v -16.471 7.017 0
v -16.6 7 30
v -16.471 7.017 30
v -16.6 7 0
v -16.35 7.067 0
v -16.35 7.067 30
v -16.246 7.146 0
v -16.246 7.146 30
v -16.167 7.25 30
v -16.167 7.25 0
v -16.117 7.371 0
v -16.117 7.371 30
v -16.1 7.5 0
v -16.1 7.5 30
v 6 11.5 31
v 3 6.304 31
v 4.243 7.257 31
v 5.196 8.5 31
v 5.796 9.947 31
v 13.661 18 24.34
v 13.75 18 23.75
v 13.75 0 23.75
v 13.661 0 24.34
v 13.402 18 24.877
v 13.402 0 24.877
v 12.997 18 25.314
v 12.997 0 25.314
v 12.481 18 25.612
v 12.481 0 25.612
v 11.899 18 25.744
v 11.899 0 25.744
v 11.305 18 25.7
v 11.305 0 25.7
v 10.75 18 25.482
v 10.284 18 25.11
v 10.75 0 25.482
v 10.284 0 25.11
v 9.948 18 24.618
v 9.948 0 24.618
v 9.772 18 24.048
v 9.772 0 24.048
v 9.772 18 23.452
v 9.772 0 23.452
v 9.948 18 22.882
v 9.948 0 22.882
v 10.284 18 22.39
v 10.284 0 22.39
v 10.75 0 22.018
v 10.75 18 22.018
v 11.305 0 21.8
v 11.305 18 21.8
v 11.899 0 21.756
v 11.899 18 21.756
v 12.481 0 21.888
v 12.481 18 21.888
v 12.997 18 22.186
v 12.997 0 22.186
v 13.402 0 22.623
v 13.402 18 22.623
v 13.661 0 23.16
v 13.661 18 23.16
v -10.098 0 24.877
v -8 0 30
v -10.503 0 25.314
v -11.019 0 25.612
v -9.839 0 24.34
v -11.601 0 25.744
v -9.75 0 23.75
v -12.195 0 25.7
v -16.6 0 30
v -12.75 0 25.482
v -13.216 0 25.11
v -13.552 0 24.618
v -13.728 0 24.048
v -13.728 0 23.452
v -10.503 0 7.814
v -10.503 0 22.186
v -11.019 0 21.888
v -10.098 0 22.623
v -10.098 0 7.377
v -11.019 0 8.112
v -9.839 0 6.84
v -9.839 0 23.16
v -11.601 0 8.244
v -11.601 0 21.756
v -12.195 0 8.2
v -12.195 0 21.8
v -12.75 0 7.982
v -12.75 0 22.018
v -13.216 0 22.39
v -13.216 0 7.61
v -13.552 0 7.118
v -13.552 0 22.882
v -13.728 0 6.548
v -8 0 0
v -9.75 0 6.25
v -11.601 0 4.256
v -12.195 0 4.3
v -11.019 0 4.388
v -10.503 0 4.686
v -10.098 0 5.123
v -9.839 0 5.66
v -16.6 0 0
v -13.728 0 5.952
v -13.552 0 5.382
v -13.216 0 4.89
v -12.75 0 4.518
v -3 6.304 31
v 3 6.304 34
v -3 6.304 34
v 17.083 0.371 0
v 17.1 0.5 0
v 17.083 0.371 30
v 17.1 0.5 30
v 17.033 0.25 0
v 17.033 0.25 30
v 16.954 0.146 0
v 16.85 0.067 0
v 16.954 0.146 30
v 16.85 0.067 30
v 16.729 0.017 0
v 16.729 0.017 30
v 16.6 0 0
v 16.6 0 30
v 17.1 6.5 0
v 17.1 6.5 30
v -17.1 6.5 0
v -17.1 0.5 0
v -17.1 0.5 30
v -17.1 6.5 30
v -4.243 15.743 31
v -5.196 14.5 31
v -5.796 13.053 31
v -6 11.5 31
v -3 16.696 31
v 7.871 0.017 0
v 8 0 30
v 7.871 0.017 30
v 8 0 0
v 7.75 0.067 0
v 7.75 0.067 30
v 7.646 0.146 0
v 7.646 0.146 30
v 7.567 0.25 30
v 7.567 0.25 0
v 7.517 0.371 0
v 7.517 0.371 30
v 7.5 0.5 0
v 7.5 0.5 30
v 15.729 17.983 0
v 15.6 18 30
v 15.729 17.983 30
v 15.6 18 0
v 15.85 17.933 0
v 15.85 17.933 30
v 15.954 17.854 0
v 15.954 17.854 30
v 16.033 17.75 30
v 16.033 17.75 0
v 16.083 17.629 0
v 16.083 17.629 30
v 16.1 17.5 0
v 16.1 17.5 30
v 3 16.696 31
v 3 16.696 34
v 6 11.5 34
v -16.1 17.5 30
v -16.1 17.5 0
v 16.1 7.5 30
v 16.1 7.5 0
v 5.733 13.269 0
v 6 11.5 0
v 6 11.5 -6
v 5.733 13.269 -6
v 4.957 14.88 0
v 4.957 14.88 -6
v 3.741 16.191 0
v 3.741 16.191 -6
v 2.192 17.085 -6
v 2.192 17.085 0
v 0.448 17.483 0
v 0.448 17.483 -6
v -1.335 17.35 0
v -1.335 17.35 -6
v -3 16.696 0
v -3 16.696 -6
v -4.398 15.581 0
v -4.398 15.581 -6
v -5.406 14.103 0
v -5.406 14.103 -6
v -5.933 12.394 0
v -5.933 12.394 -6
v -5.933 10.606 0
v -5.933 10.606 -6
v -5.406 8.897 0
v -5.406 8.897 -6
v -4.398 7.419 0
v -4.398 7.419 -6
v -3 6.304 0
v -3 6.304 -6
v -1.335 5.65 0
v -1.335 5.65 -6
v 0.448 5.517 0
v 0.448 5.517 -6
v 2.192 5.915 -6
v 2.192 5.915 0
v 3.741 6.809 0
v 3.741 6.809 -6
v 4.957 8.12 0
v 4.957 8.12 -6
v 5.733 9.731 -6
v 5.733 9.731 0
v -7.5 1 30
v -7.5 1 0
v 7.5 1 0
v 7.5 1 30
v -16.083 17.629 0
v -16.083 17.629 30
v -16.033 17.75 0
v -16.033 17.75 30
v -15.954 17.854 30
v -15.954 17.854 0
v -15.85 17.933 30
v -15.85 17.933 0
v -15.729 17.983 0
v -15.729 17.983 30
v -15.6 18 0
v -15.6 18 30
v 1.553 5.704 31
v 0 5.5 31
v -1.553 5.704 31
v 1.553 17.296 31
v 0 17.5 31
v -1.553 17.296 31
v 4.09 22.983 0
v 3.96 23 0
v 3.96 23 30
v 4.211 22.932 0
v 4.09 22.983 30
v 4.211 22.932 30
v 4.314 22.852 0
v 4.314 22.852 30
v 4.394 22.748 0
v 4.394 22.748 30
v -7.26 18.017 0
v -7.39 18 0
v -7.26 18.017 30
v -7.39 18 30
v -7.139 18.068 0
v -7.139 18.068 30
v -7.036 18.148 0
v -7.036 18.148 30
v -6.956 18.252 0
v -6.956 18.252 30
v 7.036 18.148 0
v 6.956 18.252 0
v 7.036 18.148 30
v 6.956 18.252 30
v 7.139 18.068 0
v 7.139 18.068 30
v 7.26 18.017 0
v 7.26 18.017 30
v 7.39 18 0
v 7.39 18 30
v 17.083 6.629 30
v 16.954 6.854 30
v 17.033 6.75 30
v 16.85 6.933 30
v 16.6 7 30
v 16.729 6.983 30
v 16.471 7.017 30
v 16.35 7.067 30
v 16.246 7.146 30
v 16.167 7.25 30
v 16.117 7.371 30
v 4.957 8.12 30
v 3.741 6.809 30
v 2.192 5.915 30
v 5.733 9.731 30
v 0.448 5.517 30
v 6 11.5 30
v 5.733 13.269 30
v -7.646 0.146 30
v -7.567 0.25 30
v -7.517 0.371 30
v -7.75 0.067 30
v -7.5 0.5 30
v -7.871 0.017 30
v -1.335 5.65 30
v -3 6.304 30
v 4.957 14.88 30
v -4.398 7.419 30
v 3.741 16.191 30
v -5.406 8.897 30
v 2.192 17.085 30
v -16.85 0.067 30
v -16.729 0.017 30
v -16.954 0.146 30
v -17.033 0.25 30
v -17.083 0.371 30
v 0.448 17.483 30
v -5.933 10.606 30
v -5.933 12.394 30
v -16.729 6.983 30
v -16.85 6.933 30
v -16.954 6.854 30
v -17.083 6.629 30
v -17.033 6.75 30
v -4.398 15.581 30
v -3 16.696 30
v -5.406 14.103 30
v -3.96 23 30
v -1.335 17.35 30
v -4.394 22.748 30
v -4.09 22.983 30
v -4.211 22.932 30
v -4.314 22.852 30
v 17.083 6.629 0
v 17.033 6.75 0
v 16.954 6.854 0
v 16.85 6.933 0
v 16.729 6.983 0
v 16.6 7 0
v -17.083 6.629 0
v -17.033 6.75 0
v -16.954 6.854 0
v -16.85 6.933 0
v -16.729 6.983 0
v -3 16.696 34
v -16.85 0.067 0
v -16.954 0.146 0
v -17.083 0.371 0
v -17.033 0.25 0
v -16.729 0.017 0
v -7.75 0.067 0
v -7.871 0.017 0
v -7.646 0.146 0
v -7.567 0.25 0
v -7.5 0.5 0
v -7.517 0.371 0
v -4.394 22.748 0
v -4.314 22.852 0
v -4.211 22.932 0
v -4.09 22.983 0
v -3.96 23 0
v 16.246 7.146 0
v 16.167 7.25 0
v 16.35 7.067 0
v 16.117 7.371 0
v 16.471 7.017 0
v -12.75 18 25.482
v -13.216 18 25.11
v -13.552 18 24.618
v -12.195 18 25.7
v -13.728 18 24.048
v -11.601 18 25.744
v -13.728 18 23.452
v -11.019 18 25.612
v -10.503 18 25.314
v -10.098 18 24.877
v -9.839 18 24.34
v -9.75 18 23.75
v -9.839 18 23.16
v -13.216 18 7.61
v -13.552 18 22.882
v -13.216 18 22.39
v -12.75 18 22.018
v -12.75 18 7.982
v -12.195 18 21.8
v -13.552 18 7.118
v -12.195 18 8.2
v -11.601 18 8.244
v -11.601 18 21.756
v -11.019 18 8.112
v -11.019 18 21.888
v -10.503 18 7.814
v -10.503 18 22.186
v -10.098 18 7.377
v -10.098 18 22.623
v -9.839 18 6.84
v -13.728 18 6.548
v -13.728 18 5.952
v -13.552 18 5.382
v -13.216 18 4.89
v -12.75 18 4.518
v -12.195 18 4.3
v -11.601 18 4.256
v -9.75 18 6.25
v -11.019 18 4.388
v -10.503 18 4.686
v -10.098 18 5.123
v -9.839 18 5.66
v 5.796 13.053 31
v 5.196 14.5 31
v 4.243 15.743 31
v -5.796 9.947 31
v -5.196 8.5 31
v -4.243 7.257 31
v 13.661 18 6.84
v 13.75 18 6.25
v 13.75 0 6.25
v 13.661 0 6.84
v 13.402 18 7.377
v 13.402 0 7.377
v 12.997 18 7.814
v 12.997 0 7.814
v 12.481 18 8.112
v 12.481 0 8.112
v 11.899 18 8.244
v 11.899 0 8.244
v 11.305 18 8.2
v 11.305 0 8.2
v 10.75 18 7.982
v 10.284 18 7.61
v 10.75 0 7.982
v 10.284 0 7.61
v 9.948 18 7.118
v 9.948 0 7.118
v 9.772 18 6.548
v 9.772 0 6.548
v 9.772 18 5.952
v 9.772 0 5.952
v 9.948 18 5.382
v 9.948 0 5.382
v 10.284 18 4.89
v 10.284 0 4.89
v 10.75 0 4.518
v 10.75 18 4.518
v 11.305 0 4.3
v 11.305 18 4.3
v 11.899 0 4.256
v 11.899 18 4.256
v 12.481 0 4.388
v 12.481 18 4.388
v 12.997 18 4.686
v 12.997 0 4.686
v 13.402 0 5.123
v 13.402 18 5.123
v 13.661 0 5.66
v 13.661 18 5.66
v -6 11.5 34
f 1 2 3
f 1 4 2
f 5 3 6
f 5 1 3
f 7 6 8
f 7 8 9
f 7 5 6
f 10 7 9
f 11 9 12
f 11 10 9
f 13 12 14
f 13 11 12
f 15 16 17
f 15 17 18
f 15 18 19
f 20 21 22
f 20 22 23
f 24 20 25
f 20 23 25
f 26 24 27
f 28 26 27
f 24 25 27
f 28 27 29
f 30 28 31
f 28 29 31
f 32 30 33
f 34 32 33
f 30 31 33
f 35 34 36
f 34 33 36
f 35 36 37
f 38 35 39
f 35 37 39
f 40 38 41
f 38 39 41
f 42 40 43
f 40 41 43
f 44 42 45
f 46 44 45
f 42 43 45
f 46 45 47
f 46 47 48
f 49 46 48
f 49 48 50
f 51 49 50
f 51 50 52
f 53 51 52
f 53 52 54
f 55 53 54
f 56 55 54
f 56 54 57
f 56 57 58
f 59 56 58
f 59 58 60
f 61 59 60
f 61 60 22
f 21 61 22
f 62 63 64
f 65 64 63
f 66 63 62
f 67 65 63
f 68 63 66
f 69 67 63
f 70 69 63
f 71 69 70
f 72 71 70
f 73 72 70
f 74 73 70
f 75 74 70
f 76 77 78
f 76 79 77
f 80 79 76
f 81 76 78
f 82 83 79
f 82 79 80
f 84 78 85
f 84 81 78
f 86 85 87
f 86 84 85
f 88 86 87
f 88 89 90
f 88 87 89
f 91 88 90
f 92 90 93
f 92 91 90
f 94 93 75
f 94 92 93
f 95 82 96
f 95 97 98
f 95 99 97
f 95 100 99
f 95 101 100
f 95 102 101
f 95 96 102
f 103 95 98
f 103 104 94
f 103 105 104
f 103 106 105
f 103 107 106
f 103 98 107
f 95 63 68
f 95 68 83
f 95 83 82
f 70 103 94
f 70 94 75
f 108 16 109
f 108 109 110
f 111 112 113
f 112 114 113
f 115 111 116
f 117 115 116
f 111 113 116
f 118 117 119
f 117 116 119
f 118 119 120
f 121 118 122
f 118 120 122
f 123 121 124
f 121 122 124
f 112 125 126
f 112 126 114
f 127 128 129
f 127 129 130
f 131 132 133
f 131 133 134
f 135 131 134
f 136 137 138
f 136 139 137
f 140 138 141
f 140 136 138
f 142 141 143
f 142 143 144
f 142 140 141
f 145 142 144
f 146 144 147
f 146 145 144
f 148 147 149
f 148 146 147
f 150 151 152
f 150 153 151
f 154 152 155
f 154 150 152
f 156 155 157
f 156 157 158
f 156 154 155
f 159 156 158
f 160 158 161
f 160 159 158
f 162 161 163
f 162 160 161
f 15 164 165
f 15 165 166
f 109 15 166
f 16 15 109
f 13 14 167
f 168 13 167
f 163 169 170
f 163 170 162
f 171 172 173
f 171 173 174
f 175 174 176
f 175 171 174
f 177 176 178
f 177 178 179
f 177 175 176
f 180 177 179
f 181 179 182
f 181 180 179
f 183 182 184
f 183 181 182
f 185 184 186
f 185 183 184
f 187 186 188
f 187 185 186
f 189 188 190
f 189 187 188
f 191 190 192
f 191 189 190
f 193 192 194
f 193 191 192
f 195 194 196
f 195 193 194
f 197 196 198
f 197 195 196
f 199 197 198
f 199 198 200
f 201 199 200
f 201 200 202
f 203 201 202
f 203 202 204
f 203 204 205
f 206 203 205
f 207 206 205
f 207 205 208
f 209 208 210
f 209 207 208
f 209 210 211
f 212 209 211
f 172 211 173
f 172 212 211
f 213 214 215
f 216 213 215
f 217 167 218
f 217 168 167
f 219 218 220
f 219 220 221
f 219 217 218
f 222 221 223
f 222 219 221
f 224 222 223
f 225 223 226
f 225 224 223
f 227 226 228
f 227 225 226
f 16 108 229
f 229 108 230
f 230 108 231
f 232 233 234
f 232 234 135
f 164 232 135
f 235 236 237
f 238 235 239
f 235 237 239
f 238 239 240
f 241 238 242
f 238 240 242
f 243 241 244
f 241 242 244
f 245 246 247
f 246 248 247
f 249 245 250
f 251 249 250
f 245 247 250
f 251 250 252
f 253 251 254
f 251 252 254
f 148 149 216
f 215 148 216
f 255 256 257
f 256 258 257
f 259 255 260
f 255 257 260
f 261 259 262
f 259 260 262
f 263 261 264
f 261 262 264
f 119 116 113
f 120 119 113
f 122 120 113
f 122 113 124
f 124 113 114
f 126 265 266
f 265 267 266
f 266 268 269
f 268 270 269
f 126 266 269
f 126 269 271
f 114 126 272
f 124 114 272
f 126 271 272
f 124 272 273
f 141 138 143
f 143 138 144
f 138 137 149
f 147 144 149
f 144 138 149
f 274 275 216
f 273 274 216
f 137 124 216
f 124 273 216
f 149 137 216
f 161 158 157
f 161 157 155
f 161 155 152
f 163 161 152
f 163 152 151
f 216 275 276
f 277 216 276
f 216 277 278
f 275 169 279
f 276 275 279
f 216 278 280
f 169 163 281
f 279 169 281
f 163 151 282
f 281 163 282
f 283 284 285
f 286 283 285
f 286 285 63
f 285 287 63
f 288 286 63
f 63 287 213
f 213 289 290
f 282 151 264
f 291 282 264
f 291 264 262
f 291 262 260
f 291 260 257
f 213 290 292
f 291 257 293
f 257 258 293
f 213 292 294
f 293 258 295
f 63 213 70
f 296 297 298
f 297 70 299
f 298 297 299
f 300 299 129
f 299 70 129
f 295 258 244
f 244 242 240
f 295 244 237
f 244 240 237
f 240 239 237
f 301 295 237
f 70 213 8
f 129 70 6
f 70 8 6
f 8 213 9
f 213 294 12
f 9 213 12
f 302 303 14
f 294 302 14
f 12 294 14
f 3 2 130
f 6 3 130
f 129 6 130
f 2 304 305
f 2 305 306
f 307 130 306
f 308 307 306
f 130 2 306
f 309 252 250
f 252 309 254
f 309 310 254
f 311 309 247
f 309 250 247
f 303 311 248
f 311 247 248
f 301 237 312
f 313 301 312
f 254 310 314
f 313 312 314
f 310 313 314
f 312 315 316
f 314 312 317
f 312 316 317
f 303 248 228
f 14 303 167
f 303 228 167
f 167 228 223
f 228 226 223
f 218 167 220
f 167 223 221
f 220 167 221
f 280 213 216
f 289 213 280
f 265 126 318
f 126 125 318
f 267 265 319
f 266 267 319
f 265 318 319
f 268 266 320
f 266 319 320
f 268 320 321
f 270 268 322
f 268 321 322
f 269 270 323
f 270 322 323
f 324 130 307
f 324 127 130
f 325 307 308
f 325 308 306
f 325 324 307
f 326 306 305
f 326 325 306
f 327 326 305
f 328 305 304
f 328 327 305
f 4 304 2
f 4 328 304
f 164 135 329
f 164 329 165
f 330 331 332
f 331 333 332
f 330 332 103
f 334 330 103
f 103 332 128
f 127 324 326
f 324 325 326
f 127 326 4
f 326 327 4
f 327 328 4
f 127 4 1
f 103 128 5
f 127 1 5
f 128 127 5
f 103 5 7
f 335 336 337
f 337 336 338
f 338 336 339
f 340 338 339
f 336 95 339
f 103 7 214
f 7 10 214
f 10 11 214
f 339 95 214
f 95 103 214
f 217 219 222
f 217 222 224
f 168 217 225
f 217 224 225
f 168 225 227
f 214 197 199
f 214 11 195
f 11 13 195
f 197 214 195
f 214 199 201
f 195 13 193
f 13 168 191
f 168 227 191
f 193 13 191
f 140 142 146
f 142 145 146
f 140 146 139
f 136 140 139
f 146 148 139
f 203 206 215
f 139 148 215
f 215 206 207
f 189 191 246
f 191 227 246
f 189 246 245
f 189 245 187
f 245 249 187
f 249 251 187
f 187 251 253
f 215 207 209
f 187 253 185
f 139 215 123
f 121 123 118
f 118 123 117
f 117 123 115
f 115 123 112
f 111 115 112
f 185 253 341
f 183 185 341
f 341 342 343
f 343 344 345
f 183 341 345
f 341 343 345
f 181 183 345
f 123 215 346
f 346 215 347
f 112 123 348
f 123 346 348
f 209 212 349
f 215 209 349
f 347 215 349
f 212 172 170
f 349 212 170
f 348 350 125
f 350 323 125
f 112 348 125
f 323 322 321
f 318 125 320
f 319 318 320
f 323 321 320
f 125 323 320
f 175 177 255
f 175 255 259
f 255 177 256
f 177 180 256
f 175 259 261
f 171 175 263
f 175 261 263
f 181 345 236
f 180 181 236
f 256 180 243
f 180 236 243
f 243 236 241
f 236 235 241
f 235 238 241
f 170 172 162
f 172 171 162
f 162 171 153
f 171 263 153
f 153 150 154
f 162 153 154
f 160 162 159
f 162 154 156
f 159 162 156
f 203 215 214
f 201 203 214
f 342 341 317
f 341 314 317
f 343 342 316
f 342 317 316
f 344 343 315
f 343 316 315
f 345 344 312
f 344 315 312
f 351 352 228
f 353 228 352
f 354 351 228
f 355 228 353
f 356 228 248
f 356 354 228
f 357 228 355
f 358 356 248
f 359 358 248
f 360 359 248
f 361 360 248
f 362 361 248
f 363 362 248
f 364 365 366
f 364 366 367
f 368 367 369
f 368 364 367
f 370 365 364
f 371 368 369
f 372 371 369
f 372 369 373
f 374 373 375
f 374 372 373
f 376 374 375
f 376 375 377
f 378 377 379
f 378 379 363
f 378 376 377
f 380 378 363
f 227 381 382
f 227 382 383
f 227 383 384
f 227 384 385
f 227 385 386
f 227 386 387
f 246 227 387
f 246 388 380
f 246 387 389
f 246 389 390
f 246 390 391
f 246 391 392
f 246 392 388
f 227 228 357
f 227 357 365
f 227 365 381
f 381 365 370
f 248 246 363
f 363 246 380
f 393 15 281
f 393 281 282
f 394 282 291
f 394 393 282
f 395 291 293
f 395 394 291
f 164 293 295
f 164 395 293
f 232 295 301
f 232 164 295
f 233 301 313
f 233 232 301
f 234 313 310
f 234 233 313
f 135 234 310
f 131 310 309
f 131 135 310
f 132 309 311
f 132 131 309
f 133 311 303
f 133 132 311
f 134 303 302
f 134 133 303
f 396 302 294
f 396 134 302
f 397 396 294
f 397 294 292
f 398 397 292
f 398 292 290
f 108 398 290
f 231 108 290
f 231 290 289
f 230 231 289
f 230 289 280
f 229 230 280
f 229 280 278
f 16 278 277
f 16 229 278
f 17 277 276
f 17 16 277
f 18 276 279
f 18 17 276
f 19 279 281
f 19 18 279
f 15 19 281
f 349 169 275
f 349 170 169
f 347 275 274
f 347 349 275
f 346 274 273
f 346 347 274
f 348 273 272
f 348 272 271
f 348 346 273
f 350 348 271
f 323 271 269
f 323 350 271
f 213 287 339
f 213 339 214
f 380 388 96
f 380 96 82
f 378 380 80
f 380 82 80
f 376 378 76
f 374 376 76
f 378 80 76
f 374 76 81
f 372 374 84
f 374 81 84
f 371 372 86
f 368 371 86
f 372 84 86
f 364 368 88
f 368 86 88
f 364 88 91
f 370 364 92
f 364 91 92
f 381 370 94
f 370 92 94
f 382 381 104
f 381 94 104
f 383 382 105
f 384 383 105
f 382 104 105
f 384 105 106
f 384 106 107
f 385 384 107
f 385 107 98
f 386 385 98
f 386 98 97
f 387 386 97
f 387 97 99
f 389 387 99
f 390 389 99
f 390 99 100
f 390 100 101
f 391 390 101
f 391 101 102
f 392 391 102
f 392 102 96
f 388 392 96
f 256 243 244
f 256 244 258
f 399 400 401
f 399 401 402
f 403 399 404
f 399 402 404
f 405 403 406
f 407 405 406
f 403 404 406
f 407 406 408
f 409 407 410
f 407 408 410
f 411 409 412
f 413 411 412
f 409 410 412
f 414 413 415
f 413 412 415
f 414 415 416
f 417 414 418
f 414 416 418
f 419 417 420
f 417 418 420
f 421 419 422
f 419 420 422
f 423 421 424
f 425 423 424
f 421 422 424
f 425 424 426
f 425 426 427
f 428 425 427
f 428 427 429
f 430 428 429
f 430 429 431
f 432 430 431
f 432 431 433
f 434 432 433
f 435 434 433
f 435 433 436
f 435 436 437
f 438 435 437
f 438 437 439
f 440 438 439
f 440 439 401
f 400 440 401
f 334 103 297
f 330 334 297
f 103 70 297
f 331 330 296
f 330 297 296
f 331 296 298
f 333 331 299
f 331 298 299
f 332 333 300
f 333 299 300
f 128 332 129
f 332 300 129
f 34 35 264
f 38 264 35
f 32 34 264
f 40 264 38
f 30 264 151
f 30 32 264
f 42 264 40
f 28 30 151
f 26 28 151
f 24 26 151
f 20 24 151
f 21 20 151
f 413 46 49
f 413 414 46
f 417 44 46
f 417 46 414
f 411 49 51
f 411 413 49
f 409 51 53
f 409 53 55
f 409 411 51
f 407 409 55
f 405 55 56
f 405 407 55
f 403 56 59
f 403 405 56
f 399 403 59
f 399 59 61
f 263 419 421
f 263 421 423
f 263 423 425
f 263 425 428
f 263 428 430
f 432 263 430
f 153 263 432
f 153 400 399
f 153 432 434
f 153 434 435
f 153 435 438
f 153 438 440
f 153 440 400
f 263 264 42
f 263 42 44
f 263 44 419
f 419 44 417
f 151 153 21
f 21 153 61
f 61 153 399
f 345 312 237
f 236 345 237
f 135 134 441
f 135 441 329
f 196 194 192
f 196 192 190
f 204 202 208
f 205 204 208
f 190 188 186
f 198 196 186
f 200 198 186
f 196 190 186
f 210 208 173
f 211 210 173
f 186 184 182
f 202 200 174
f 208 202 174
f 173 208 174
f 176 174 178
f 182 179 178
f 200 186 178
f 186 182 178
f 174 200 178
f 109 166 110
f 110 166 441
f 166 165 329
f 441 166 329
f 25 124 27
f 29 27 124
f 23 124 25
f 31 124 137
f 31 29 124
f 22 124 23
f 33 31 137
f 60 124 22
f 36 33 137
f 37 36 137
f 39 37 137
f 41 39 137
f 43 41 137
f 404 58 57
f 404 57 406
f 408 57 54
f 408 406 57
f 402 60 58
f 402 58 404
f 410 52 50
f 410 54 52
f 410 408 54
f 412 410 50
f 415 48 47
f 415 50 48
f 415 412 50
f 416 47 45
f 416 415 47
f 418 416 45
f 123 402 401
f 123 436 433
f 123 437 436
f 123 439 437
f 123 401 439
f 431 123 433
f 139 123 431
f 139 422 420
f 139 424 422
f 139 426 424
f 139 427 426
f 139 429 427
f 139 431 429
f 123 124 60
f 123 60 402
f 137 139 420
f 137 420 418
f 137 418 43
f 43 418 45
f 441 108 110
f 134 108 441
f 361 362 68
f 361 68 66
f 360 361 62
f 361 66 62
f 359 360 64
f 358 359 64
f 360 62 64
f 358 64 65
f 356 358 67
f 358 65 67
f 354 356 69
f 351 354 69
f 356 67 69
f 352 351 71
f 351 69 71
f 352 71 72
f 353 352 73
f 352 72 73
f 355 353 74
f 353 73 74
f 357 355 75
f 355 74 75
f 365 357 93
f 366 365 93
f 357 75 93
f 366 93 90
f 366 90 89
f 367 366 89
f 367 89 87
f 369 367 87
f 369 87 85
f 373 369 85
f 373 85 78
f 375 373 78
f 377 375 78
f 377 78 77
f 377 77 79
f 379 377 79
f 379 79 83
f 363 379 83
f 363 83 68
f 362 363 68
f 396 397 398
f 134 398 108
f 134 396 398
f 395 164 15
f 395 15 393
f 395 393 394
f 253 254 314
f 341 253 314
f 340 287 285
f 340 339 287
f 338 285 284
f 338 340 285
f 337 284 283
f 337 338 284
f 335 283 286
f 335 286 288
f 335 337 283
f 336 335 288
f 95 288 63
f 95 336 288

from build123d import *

# Parameters (mm, degrees)
SKETCH_2_R          = 6
EXTRUDE_1_DEPTH     = 30
SKETCH_2_3_R        = 6
EXTRUDE_2_DEPTH     = 6
EXTRUDE_START       = 31
SKETCH_2_4_R        = 6
EXTRUDE_3_DEPTH     = 1
CUT_EXTRUDE_1_REACH = 44.219
SKETCH_4_R          = 2
CUT_EXTRUDE_2_REACH = 48.015
SKETCH_5_W          = 1
SKETCH_5_H          = 11
SKETCH_5_W_2        = 15
SKETCH_5_H_2        = 1
FILLET_1_R          = 0.5
EXTRUDE_4_DEPTH     = 3


with BuildPart() as part:
    # 草图2 → 凸台-拉伸1 (new body)
    # profile 1 of 2: a face of its own
    with BuildSketch(Plane.XY):
        Polygon((17.1, 18), (17.1, 0), (-17.1, 0), (-17.1, 18), (-7.1, 18), (-4.25, 23), (4.25, 23), (7.1, 18), align=None)
        with Locations((0, 11.5)):
            Circle(SKETCH_2_R, mode=Mode.SUBTRACT)
    # profile 2 of 2: a face of its own
    with BuildSketch(Plane.XY):
        with Locations((0, 11.5)):
            Circle(SKETCH_2_R)
    extrude(amount=EXTRUDE_1_DEPTH)

    # 草图2<3> → 凸台-拉伸2 (add)
    with BuildSketch(Plane.XY):
        with Locations((0, 11.5)):
            Circle(SKETCH_2_3_R)
    extrude(amount=-EXTRUDE_2_DEPTH)

    # 草图2<4> → 凸台-拉伸3 (add)
    with BuildSketch(Plane.XY.offset(EXTRUDE_START)):
        with Locations((0, 11.5)):
            Circle(SKETCH_2_4_R)
    extrude(amount=-EXTRUDE_3_DEPTH)

    # 草图4 → 切除-拉伸1 (cut, up to next)
    with BuildSketch(Plane.XZ, mode=Mode.PRIVATE) as cut_extrude_1_sk1:
        with Locations((11.75, 23.75)):
            Circle(SKETCH_4_R)
    cut_extrude_1_tool1 = extrude(cut_extrude_1_sk1.sketch, amount=-CUT_EXTRUDE_1_REACH, mode=Mode.PRIVATE) & part.part
    # 草图4 → 切除-拉伸1 (cut, up to next)
    with BuildSketch(Plane.XZ, mode=Mode.PRIVATE) as cut_extrude_1_sk2:
        with Locations((11.75, 6.25)):
            Circle(SKETCH_4_R)
    cut_extrude_1_tool2 = extrude(cut_extrude_1_sk2.sketch, amount=-CUT_EXTRUDE_1_REACH, mode=Mode.PRIVATE) & part.part
    # 草图4 → 切除-拉伸1 (cut, up to next)
    with BuildSketch(Plane.XZ, mode=Mode.PRIVATE) as cut_extrude_1_sk3:
        with Locations((-11.75, 23.75)):
            Circle(SKETCH_4_R)
    cut_extrude_1_tool3 = extrude(cut_extrude_1_sk3.sketch, amount=-CUT_EXTRUDE_1_REACH, mode=Mode.PRIVATE) & part.part
    # 草图4 → 切除-拉伸1 (cut, up to next)
    with BuildSketch(Plane.XZ, mode=Mode.PRIVATE) as cut_extrude_1_sk4:
        with Locations((-11.75, 6.25)):
            Circle(SKETCH_4_R)
    cut_extrude_1_tool4 = extrude(cut_extrude_1_sk4.sketch, amount=-CUT_EXTRUDE_1_REACH, mode=Mode.PRIVATE) & part.part
    add(cut_extrude_1_tool1.solids().sort_by_distance((11.75, 0, 23.75))[0], mode=Mode.SUBTRACT)
    add(cut_extrude_1_tool2.solids().sort_by_distance((11.75, 0, 6.25))[0], mode=Mode.SUBTRACT)
    add(cut_extrude_1_tool3.solids().sort_by_distance((-11.75, 0, 23.75))[0], mode=Mode.SUBTRACT)
    add(cut_extrude_1_tool4.solids().sort_by_distance((-11.75, 0, 6.25))[0], mode=Mode.SUBTRACT)

    # 草图5 → 切除-拉伸2 (cut, up to next)
    with BuildSketch(Plane.XY.offset(30), mode=Mode.PRIVATE) as cut_extrude_2_sk1:
        with Locations((16.6, 12.5)):
            Rectangle(SKETCH_5_W, SKETCH_5_H)
    cut_extrude_2_tool1 = extrude(cut_extrude_2_sk1.sketch, amount=-CUT_EXTRUDE_2_REACH, mode=Mode.PRIVATE) & part.part
    # 草图5 → 切除-拉伸2 (cut, up to next)
    with BuildSketch(Plane.XY.offset(30), mode=Mode.PRIVATE) as cut_extrude_2_sk2:
        with Locations((-16.6, 12.5)):
            Rectangle(SKETCH_5_W, SKETCH_5_H)
    cut_extrude_2_tool2 = extrude(cut_extrude_2_sk2.sketch, amount=-CUT_EXTRUDE_2_REACH, mode=Mode.PRIVATE) & part.part
    # 草图5 → 切除-拉伸2 (cut, up to next)
    with BuildSketch(Plane.XY.offset(30), mode=Mode.PRIVATE) as cut_extrude_2_sk3:
        with Locations((0, 0.5)):
            Rectangle(SKETCH_5_W_2, SKETCH_5_H_2)
    cut_extrude_2_tool3 = extrude(cut_extrude_2_sk3.sketch, amount=-CUT_EXTRUDE_2_REACH, mode=Mode.PRIVATE) & part.part
    add(cut_extrude_2_tool1.solids().sort_by_distance((16.6, 12.5, 30))[0], mode=Mode.SUBTRACT)
    add(cut_extrude_2_tool2.solids().sort_by_distance((-16.6, 12.5, 30))[0], mode=Mode.SUBTRACT)
    add(cut_extrude_2_tool3.solids().sort_by_distance((0, 0.5, 30))[0], mode=Mode.SUBTRACT)

    # 圆角1
    fillet_1_edges = [part.edges().sort_by_distance(p)[0] for p in [
        (17.1, 0, 15),
        (7.5, 0, 15),
        (-7.5, 0, 15),
        (-17.1, 0, 15),
        (-17.1, 7, 15),
        (-16.1, 7, 15),
        (-16.1, 18, 15),
        (17.1, 7, 15),
        (16.1, 7, 15),
        (16.1, 18, 15),
        (-7.1, 18, 15),
        (7.1, 18, 15),
        (-4.25, 23, 15),
        (4.25, 23, 15),
    ]]
    fillet(fillet_1_edges, radius=FILLET_1_R - 0.0001)  # a hair under: the kernel refuses the full size

    # 草图6 → 凸台-拉伸4 (add)
    with BuildSketch(Plane.XY.offset(31)):
        Polygon((-3, 16.696152423), (3, 16.696152423), (6, 11.5), (3, 6.303847577), (-3, 6.303847577), (-6, 11.5), align=None)
    extrude(amount=EXTRUDE_4_DEPTH)


solid = part.part
